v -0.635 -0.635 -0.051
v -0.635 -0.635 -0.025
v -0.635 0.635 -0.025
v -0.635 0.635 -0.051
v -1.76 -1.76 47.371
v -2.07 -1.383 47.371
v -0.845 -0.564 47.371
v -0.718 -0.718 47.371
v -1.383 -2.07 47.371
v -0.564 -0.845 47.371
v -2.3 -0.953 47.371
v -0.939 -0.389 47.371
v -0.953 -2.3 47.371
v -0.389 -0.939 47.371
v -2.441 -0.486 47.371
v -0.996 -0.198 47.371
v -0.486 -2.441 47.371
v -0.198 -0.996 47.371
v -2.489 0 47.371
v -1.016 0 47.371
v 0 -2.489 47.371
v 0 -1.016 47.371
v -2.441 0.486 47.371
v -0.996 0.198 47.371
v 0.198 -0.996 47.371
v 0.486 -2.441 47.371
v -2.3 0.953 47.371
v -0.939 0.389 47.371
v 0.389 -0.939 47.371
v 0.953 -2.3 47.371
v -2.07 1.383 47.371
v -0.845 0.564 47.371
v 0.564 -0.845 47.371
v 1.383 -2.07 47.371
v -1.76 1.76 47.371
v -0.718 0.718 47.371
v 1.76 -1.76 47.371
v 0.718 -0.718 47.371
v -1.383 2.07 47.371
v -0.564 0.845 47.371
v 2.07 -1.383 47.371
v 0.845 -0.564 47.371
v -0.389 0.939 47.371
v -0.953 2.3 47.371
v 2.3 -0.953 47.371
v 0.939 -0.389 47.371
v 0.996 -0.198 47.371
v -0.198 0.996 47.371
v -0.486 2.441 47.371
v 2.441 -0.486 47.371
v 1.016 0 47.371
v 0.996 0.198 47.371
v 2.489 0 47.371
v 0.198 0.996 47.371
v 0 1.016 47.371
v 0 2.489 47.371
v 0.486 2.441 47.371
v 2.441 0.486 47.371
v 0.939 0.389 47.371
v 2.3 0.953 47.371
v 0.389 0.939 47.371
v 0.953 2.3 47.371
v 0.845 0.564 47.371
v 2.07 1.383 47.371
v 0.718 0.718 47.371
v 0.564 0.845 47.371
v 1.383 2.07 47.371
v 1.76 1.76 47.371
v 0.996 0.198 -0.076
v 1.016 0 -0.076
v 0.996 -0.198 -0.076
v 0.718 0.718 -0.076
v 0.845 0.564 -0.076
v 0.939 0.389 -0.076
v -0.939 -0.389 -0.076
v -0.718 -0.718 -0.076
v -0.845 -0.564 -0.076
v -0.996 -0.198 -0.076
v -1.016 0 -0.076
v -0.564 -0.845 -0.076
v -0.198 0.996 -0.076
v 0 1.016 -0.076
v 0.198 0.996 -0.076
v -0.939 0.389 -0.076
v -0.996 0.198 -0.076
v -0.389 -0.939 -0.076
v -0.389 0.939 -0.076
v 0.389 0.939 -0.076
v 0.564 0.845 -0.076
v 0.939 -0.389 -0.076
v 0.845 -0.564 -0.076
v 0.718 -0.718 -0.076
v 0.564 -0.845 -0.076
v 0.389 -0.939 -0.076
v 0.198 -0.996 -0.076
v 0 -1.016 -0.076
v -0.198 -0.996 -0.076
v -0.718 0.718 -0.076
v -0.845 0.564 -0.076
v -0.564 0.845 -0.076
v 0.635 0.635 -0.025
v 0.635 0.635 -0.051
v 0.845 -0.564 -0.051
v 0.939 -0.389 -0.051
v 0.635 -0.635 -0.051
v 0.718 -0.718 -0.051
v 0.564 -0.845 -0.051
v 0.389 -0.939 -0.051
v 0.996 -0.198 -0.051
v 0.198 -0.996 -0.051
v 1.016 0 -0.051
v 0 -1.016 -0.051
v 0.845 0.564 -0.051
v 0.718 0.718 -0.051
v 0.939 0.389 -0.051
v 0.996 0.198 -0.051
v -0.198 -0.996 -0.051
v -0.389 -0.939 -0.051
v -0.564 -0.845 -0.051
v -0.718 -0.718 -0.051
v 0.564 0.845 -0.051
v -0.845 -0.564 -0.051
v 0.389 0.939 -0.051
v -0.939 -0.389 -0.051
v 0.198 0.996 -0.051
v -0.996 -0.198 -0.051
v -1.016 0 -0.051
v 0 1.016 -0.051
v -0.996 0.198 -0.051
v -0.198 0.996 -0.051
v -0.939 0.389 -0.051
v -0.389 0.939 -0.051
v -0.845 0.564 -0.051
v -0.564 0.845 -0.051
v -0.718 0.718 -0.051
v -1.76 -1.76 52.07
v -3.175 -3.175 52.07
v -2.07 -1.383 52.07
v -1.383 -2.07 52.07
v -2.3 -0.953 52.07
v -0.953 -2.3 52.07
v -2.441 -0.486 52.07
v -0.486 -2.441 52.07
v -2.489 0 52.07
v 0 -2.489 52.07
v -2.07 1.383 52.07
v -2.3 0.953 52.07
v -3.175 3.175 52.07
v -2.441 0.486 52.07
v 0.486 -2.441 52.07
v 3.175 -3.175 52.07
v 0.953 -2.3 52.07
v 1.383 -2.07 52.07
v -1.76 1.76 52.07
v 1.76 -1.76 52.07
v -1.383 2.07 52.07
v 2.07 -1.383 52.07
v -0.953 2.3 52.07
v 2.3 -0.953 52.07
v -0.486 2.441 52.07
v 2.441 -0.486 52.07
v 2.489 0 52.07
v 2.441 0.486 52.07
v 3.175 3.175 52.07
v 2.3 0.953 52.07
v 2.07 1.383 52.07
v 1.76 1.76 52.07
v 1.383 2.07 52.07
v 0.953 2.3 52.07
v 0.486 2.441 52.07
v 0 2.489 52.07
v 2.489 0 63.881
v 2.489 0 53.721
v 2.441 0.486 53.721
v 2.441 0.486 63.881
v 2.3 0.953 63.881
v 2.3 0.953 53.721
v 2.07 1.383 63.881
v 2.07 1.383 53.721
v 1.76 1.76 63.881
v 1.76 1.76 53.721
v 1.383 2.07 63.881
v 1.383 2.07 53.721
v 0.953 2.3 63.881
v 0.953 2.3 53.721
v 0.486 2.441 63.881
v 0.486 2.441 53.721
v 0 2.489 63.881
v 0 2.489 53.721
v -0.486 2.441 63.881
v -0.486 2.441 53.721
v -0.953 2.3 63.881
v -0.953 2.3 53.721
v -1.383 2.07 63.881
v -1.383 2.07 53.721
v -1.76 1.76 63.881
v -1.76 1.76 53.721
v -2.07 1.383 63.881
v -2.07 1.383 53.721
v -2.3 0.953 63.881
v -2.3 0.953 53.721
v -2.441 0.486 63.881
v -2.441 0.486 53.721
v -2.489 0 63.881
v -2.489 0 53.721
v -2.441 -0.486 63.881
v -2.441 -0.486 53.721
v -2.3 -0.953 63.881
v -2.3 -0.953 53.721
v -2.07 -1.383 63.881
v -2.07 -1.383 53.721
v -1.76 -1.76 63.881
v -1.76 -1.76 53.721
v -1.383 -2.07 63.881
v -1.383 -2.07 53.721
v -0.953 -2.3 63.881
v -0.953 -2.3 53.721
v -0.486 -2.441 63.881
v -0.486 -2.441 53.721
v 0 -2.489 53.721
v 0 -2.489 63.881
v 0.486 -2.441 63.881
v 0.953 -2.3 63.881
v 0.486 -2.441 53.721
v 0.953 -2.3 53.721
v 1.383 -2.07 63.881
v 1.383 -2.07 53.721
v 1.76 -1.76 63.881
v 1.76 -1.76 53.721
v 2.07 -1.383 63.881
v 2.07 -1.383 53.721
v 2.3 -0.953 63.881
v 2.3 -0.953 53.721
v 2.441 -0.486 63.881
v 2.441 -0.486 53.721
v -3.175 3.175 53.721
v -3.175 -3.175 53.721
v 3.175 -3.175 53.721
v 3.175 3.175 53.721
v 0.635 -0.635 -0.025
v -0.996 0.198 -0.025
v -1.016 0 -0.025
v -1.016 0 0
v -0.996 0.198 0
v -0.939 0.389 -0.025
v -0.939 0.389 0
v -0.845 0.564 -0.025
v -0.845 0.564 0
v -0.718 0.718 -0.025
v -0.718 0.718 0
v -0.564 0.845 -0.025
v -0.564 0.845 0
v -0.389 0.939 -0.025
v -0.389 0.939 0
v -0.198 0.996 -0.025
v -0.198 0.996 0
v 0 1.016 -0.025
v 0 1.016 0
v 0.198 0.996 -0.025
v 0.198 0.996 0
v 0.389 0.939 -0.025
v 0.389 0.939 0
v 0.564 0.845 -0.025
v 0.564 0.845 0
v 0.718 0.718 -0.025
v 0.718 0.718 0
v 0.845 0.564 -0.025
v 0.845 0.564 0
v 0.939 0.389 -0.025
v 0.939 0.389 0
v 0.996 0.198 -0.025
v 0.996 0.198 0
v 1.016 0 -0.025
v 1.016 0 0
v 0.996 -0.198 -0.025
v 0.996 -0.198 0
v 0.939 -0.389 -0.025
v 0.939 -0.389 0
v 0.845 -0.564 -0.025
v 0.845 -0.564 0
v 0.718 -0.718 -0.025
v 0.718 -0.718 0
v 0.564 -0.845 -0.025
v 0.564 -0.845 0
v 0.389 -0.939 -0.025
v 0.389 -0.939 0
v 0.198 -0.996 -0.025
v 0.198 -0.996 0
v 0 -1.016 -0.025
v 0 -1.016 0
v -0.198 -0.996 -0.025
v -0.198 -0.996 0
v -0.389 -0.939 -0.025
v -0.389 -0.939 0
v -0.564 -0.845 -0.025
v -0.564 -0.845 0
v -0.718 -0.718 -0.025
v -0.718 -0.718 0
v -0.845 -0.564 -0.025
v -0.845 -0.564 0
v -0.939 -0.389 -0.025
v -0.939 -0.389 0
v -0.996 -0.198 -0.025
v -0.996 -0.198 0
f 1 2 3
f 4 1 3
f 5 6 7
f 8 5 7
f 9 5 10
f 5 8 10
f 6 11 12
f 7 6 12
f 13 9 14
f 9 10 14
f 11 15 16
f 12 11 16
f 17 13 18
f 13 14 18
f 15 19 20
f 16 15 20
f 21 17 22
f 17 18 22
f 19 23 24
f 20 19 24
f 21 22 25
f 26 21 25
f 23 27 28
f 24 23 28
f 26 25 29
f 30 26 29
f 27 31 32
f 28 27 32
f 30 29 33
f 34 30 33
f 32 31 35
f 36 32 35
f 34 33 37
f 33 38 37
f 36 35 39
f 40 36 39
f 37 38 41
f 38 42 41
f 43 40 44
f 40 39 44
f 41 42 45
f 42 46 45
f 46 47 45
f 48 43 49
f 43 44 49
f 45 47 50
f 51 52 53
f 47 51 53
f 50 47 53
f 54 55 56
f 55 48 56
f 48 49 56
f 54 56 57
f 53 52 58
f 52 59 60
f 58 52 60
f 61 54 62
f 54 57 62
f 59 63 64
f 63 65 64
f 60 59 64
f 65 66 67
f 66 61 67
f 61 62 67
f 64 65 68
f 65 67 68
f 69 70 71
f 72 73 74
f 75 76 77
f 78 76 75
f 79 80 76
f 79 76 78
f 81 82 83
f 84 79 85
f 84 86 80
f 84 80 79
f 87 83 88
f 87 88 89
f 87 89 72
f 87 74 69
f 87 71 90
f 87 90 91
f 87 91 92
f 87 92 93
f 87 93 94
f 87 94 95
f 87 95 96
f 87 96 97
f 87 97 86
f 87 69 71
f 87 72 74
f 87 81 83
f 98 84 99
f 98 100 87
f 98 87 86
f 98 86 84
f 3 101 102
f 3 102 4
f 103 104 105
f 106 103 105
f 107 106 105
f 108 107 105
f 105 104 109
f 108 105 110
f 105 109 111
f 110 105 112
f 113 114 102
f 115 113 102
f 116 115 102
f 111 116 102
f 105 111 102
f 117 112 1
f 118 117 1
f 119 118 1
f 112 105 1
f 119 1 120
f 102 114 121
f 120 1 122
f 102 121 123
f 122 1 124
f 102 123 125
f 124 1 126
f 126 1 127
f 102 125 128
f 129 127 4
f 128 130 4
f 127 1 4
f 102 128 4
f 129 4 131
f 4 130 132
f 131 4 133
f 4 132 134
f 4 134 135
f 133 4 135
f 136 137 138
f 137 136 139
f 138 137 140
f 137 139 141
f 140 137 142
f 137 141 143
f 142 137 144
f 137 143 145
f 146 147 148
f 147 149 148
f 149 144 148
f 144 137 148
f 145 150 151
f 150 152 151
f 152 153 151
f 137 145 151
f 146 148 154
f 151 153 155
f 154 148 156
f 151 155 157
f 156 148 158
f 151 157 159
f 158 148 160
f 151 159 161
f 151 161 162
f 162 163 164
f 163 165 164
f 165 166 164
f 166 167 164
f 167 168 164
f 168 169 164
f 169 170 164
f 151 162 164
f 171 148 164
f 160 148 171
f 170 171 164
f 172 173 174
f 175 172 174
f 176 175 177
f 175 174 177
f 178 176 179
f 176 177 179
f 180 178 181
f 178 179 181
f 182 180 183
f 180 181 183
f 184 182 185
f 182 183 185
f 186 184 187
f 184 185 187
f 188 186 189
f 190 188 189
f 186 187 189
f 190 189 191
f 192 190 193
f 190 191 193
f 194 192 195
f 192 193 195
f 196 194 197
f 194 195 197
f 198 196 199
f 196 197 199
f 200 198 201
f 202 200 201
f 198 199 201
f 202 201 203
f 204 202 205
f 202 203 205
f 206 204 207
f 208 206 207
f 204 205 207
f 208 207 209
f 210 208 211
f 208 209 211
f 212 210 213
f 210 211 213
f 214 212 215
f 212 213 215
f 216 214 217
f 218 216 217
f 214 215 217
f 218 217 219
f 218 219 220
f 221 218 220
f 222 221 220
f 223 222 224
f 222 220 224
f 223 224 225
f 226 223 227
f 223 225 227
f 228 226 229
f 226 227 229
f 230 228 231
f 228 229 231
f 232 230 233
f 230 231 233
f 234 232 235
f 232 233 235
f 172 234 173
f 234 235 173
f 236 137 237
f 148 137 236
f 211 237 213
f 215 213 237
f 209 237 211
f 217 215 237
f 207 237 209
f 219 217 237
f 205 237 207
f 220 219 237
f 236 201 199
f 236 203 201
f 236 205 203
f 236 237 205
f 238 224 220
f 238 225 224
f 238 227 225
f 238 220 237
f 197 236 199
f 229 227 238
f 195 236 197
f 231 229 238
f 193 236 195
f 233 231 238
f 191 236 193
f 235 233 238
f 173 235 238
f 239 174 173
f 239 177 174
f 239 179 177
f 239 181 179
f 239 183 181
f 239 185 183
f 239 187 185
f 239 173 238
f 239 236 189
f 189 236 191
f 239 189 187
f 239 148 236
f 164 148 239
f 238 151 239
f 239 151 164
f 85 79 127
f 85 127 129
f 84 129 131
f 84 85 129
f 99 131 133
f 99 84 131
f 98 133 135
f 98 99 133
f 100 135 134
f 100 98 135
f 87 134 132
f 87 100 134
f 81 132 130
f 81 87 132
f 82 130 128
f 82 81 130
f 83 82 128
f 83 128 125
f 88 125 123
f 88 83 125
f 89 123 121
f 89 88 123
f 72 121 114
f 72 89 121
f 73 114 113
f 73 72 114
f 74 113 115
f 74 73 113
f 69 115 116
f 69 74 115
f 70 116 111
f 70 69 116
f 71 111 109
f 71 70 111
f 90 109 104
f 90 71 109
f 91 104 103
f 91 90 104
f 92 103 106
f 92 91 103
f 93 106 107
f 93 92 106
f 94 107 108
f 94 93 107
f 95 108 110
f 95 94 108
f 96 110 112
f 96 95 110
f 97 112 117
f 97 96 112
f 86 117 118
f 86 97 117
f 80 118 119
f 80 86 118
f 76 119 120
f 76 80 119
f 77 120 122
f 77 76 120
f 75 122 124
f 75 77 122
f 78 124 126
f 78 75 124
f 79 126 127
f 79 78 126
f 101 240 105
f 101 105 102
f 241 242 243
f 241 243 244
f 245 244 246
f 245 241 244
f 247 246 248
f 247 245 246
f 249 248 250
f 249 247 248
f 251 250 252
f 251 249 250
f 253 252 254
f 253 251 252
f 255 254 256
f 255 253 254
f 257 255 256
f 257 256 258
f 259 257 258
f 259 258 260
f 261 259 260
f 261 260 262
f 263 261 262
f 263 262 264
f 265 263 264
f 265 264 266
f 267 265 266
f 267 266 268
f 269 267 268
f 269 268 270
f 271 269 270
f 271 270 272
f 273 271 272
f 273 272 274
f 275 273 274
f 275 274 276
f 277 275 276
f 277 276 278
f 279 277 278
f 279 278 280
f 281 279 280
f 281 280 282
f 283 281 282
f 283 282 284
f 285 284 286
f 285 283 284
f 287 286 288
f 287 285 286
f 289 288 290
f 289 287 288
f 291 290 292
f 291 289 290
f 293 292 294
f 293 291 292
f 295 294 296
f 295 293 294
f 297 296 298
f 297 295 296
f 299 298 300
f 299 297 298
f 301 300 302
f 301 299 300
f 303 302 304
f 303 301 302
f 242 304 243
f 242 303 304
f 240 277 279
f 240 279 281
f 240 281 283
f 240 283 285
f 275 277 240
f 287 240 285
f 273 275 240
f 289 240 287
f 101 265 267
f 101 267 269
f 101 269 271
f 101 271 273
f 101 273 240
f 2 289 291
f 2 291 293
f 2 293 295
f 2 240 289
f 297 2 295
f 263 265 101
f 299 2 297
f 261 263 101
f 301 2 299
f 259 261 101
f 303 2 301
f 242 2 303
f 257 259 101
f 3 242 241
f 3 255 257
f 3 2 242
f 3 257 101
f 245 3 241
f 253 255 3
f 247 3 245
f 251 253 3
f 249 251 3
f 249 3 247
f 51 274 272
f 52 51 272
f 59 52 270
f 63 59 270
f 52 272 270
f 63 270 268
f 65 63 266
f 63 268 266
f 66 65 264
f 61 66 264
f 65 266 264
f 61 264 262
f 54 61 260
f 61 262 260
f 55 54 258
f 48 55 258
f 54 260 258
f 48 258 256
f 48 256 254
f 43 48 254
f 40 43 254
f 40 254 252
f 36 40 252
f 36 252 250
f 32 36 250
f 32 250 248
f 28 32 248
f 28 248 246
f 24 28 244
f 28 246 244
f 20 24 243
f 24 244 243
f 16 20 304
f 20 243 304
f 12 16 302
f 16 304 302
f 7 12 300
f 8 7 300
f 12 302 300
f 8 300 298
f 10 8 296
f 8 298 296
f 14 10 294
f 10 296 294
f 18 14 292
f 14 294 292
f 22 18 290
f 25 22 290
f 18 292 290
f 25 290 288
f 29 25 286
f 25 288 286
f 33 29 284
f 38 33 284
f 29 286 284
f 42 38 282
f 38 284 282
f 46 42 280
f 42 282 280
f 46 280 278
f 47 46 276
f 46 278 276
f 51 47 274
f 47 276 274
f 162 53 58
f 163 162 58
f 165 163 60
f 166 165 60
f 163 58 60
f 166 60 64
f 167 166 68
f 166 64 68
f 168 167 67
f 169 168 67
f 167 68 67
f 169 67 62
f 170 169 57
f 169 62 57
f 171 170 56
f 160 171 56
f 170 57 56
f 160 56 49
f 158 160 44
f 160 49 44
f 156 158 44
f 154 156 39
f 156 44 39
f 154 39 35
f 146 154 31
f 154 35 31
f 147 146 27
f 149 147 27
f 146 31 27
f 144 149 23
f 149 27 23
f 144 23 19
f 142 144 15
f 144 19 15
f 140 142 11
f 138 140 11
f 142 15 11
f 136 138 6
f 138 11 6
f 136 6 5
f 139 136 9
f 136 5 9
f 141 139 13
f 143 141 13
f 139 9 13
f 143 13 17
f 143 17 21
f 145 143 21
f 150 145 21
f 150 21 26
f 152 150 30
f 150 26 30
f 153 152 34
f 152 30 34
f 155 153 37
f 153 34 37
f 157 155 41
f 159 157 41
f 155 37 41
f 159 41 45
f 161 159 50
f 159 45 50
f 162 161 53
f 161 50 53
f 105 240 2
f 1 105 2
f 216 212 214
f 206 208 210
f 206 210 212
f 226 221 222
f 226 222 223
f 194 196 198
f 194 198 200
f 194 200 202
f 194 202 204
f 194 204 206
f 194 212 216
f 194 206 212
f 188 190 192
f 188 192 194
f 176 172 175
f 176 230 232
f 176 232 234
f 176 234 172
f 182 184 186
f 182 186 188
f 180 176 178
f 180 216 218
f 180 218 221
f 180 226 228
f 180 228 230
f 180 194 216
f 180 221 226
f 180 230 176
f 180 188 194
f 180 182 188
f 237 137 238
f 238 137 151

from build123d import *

# Parameters (mm, degrees)
SKETCH1_R           = 1.016
BOSS_EXTRUDE1_DEPTH = 47.371
BOSS_EXTRUDE2_START = 0.0254
SKETCH2_R           = 1.016
BOSS_EXTRUDE2_DEPTH = 0.0254
SKETCH3_W           = 1.27
SKETCH3_H           = 1.27
BOSS_EXTRUDE3_DEPTH = 0.0254
BOSS_EXTRUDE4_START = 0.0254
SKETCH4_R           = 1.016
BOSS_EXTRUDE4_DEPTH = 0.0254
SKETCH5_R           = 2.4892
BOSS_EXTRUDE5_DEPTH = 4.699
SKETCH6_W           = 6.35
SKETCH6_H           = 6.35
BOSS_EXTRUDE6_DEPTH = 1.651
SKETCH7_R           = 2.4892
BOSS_EXTRUDE7_DEPTH = 10.16


with BuildPart() as part:
    # Sketch1 → Boss-Extrude1 (new body)
    with BuildSketch(Plane.XY):
        Circle(SKETCH1_R)
    extrude(amount=BOSS_EXTRUDE1_DEPTH)

    # Sketch2 → Boss-Extrude2 (add)
    with BuildSketch(Plane(origin=(0, 0, 0), x_dir=(-1, 0, 0), z_dir=(0, 0, -1)).offset(BOSS_EXTRUDE2_START)):
        Circle(SKETCH2_R)
    extrude(amount=-BOSS_EXTRUDE2_DEPTH)

    # Sketch3 → Boss-Extrude3 (add)
    with BuildSketch(Plane(origin=(0, 0, -0.0254), x_dir=(-1, 0, 0), z_dir=(0, 0, -1))):
        Rectangle(SKETCH3_W, SKETCH3_H)
    extrude(amount=BOSS_EXTRUDE3_DEPTH)

    # Sketch4 → Boss-Extrude4 (add)
    with BuildSketch(Plane(origin=(0, 0, -0.0508), x_dir=(-1, 0, 0), z_dir=(0, 0, -1)).offset(BOSS_EXTRUDE4_START)):
        Circle(SKETCH4_R)
    extrude(amount=-BOSS_EXTRUDE4_DEPTH)

    # Sketch5 → Boss-Extrude5 (add)
    with BuildSketch(Plane.XY.offset(47.371)):
        Circle(SKETCH5_R)
    extrude(amount=BOSS_EXTRUDE5_DEPTH)

    # Sketch6 → Boss-Extrude6 (add)
    with BuildSketch(Plane.XY.offset(52.07)):
        Rectangle(SKETCH6_W, SKETCH6_H)
    extrude(amount=BOSS_EXTRUDE6_DEPTH)

    # Sketch7 → Boss-Extrude7 (add)
    with BuildSketch(Plane.XY.offset(53.721)):
        Circle(SKETCH7_R)
    extrude(amount=BOSS_EXTRUDE7_DEPTH)


solid = part.part
